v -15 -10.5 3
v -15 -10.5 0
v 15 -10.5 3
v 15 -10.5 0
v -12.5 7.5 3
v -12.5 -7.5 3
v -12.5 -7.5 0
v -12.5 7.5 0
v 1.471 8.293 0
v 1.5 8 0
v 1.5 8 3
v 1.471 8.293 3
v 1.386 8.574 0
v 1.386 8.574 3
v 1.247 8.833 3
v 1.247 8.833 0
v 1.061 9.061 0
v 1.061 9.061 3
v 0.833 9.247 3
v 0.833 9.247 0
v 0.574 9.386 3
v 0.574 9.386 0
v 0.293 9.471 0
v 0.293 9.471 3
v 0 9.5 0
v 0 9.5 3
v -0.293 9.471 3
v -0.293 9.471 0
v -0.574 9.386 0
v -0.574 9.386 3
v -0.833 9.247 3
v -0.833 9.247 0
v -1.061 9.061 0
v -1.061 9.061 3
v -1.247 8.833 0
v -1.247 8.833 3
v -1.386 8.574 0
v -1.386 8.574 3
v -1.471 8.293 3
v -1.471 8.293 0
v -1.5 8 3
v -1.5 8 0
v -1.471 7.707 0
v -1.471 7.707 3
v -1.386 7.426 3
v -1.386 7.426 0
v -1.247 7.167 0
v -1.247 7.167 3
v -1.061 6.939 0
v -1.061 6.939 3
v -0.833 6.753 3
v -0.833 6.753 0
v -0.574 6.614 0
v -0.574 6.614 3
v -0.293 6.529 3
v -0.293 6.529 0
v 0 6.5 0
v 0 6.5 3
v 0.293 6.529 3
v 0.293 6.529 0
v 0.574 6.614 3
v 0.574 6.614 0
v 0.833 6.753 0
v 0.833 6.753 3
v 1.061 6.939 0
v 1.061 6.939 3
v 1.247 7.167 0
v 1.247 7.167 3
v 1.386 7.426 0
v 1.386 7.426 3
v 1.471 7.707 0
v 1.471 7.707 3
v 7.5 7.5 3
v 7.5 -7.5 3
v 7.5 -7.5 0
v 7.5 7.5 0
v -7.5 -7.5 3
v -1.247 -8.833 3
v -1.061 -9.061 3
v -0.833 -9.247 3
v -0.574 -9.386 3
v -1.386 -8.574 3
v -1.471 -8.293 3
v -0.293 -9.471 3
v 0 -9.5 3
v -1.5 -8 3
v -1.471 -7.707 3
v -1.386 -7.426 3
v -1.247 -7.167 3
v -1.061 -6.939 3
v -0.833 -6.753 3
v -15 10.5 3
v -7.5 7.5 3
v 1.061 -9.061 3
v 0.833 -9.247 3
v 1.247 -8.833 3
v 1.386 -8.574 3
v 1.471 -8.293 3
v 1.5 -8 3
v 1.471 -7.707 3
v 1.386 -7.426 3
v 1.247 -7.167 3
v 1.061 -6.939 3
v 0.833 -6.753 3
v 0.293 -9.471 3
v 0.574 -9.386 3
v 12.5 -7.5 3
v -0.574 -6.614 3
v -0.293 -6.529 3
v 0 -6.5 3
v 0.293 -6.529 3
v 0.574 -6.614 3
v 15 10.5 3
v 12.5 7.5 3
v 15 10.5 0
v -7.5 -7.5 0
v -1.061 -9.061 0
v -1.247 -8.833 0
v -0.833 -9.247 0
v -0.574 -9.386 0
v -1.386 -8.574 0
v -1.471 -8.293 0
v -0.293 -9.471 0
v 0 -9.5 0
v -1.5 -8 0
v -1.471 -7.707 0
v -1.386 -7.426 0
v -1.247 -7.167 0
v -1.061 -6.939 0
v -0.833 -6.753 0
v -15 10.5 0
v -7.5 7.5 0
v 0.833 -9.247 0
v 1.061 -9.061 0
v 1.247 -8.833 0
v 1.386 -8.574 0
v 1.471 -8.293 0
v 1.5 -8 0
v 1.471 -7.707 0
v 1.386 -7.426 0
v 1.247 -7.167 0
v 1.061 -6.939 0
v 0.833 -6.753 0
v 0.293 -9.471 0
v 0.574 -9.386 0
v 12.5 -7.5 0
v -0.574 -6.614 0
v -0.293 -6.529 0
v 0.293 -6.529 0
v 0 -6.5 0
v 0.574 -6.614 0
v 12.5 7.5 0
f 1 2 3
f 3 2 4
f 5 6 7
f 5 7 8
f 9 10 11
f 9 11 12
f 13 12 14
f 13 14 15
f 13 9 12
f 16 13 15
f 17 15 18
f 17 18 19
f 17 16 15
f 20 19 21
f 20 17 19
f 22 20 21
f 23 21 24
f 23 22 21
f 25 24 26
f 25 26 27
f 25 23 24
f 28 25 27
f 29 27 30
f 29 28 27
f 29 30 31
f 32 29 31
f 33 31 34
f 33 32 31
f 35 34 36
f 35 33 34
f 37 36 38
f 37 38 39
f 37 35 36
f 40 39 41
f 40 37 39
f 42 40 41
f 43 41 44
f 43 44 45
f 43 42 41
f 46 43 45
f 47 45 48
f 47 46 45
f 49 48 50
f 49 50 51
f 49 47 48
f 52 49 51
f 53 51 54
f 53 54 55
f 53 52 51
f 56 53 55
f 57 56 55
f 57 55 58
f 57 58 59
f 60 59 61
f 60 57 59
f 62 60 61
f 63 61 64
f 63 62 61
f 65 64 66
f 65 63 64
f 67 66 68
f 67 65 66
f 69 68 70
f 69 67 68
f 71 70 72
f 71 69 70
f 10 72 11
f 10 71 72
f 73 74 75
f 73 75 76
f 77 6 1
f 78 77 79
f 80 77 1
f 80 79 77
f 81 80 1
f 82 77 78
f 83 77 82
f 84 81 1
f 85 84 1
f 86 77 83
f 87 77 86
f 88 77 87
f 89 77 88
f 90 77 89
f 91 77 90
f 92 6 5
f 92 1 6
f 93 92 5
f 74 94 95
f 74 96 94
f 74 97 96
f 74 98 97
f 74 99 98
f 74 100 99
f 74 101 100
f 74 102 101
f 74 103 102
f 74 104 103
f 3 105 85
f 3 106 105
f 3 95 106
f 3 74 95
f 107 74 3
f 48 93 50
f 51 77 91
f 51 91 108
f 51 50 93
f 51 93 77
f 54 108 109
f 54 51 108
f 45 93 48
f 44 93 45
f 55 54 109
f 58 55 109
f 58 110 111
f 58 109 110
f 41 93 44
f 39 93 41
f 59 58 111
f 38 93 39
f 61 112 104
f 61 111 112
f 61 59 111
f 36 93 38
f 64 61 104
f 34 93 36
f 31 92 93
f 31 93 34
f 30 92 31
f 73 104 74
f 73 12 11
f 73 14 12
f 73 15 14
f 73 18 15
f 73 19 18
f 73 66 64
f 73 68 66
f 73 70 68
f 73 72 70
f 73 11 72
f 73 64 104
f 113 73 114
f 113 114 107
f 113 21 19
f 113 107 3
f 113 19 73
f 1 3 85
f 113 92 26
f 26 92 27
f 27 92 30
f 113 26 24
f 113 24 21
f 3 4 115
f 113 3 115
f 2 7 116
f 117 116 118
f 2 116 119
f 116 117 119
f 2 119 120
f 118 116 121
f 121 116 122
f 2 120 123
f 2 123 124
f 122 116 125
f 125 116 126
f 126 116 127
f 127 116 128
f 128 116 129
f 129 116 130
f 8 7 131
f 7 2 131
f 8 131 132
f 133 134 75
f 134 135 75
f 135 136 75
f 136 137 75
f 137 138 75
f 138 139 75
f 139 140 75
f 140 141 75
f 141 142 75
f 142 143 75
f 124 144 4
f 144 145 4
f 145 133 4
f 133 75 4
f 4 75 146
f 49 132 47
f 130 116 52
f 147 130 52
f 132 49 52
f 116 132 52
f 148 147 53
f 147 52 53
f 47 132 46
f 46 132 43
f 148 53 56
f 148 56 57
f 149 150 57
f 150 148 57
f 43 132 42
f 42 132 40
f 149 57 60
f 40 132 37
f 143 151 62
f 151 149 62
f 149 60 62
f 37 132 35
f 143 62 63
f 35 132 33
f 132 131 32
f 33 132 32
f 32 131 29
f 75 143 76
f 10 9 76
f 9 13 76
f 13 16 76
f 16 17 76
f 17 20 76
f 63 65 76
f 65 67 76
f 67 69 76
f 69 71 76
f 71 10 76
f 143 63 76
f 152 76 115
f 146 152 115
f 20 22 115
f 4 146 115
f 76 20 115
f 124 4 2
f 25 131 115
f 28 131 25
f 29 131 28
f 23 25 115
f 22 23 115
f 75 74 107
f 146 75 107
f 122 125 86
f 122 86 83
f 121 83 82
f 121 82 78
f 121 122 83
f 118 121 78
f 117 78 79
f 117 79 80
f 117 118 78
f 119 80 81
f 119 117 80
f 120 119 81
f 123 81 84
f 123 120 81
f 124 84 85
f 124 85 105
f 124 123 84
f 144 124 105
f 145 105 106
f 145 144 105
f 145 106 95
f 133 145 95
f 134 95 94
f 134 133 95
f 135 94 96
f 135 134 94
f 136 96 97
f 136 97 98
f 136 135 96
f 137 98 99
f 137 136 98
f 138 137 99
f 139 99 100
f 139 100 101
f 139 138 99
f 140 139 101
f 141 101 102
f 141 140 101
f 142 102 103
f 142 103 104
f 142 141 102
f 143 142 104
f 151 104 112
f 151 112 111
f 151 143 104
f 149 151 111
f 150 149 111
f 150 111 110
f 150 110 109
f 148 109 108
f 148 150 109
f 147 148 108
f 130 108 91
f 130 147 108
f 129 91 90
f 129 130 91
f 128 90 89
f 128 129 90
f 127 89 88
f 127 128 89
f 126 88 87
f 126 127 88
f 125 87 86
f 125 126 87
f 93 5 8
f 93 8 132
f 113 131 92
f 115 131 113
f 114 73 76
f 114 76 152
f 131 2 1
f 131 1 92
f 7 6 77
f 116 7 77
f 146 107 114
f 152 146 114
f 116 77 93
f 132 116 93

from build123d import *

# Parameters (mm, degrees)
SKETCH_1_W          = 30
SKETCH_1_H          = 21
SKETCH_1_R          = 1.5
EXTRUDE_1_DEPTH     = 3
SKETCH_2_W          = 5
SKETCH_2_H          = 15
CUT_EXTRUDE_1_DEPTH = 19.553975315


with BuildPart() as part:
    # 草图1 → 凸台-拉伸1 (new body)
    with BuildSketch(Plane.XY):
        Rectangle(SKETCH_1_W, SKETCH_1_H)
        with Locations((0, 8)):
            Circle(SKETCH_1_R, mode=Mode.SUBTRACT)
        with Locations(Location((0, -8, 0), (0, 0, 180))):
            Circle(SKETCH_1_R, mode=Mode.SUBTRACT)
    extrude(amount=EXTRUDE_1_DEPTH)

    # 草图2 → 切除-拉伸1 (cut, through all)
    with BuildSketch(Plane.XY.offset(3)):
        with Locations((-10, 0)):
            Rectangle(SKETCH_2_W, SKETCH_2_H)
        with Locations((10, 0)):
            Rectangle(SKETCH_2_W, SKETCH_2_H)
    extrude(amount=-CUT_EXTRUDE_1_DEPTH, mode=Mode.SUBTRACT)


solid = part.part
